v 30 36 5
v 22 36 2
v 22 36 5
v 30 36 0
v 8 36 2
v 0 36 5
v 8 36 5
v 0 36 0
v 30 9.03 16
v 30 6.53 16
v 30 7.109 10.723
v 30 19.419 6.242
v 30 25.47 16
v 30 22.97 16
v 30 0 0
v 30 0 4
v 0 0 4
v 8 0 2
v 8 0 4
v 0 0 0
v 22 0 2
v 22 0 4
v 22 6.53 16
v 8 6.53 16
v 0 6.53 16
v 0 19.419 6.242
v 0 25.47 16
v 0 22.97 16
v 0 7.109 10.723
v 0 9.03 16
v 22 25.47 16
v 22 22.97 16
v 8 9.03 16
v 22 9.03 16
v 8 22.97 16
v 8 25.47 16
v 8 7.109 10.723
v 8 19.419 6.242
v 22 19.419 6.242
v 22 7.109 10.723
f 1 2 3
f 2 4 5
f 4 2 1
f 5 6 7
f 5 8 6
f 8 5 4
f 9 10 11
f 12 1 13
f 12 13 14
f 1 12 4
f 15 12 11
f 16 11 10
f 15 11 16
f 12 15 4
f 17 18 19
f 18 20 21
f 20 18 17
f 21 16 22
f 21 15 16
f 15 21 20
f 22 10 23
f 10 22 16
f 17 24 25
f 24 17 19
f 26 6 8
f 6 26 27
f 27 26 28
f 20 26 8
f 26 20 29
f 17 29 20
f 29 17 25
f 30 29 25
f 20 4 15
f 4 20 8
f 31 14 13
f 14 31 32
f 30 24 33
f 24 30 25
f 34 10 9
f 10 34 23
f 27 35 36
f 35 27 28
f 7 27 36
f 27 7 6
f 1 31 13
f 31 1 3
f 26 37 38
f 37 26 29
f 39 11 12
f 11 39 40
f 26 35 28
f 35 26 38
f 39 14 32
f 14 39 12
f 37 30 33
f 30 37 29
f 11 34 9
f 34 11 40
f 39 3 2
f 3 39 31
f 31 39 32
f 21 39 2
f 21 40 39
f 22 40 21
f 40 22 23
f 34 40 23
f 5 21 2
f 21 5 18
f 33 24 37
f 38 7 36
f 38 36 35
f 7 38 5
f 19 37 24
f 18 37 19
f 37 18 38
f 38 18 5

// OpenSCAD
// Desk stands for Waveshare round display boards.
// Set `variant` below, then render. Mirrors build_stands.py exactly.
//
// Print flat on the base. No supports, no overhangs.
// Dimensions come from Waveshare's own outline drawings -- see reference/.

variant = "1.46-glass";   // "1.28" | "1.46-glass" | "1.46-bare"

//    board_d  thick   gap   lean depth base_d base_h fh bh  rh  W   slot_y nw  nf
P =
  variant=="1.28"      ? [36.50, 1.60, 2.40,20, 5.0, 27.0, 12.0, 3, 4, 2.0, 26, 12.0, 13, 2.0] :
  variant=="1.46-glass"? [44.77,12.30,13.10,20, 8.0, 36.0, 16.0, 4, 5, 2.5, 30, 16.0, 14, 2.0] :
  variant=="1.46-bare" ? [42.58,10.65,11.45,20, 8.0, 35.0, 16.0, 4, 5, 2.5, 29, 15.5, 14, 2.0] :
  undef;

board_d = P[0];  thick   = P[1];  gap        = P[2];  lean   = P[3];
depth   = P[4];  base_d  = P[5];  base_h     = P[6];  front_h= P[7];
back_h  = P[8];  ridge_half=P[9]; width      = P[10]; slot_y = P[11];
notch_w = P[12]; notch_floor = P[13];

eps = 0.01;

// horizontal offset from the groove centreline to a wall at z = base_h
wall_off = sin(lean)*(gap/2)*tan(lean) + cos(lean)*(gap/2);

module wedge() {
    rotate([90, 0, 90])
    linear_extrude(height = width)
        polygon([
            [0, 0], [base_d, 0], [base_d, back_h],
            [slot_y + wall_off + ridge_half, base_h],
            [slot_y - wall_off - ridge_half, base_h],
            [0, front_h]
        ]);
}

// the groove the board sits in
module groove() {
    translate([-eps, slot_y, base_h])
        rotate([-lean, 0, 0])
            translate([0, -gap/2, -depth])
                cube([width + 2*eps, gap, depth + base_h]);
}

// cable notch: straight through the ridge, front to back, so a USB-C lead
// can run through the stand instead of over it
module notch() {
    translate([(width - notch_w)/2, -eps, notch_floor])
        cube([notch_w, base_d + 2*eps, base_h - notch_floor + eps]);
}

difference() {
    wedge();
    groove();
    notch();
}

// Reference only -- the board in place. Uncomment to check clearances.
// %translate([width/2, slot_y - sin(lean)*depth, base_h - cos(lean)*depth])
//     rotate([-lean, 0, 0])
//         translate([0, 0, board_d/2])
//             rotate([0, 90, 0])
//                 cylinder(h = thick, d = board_d, center = true, $fn = 160);
